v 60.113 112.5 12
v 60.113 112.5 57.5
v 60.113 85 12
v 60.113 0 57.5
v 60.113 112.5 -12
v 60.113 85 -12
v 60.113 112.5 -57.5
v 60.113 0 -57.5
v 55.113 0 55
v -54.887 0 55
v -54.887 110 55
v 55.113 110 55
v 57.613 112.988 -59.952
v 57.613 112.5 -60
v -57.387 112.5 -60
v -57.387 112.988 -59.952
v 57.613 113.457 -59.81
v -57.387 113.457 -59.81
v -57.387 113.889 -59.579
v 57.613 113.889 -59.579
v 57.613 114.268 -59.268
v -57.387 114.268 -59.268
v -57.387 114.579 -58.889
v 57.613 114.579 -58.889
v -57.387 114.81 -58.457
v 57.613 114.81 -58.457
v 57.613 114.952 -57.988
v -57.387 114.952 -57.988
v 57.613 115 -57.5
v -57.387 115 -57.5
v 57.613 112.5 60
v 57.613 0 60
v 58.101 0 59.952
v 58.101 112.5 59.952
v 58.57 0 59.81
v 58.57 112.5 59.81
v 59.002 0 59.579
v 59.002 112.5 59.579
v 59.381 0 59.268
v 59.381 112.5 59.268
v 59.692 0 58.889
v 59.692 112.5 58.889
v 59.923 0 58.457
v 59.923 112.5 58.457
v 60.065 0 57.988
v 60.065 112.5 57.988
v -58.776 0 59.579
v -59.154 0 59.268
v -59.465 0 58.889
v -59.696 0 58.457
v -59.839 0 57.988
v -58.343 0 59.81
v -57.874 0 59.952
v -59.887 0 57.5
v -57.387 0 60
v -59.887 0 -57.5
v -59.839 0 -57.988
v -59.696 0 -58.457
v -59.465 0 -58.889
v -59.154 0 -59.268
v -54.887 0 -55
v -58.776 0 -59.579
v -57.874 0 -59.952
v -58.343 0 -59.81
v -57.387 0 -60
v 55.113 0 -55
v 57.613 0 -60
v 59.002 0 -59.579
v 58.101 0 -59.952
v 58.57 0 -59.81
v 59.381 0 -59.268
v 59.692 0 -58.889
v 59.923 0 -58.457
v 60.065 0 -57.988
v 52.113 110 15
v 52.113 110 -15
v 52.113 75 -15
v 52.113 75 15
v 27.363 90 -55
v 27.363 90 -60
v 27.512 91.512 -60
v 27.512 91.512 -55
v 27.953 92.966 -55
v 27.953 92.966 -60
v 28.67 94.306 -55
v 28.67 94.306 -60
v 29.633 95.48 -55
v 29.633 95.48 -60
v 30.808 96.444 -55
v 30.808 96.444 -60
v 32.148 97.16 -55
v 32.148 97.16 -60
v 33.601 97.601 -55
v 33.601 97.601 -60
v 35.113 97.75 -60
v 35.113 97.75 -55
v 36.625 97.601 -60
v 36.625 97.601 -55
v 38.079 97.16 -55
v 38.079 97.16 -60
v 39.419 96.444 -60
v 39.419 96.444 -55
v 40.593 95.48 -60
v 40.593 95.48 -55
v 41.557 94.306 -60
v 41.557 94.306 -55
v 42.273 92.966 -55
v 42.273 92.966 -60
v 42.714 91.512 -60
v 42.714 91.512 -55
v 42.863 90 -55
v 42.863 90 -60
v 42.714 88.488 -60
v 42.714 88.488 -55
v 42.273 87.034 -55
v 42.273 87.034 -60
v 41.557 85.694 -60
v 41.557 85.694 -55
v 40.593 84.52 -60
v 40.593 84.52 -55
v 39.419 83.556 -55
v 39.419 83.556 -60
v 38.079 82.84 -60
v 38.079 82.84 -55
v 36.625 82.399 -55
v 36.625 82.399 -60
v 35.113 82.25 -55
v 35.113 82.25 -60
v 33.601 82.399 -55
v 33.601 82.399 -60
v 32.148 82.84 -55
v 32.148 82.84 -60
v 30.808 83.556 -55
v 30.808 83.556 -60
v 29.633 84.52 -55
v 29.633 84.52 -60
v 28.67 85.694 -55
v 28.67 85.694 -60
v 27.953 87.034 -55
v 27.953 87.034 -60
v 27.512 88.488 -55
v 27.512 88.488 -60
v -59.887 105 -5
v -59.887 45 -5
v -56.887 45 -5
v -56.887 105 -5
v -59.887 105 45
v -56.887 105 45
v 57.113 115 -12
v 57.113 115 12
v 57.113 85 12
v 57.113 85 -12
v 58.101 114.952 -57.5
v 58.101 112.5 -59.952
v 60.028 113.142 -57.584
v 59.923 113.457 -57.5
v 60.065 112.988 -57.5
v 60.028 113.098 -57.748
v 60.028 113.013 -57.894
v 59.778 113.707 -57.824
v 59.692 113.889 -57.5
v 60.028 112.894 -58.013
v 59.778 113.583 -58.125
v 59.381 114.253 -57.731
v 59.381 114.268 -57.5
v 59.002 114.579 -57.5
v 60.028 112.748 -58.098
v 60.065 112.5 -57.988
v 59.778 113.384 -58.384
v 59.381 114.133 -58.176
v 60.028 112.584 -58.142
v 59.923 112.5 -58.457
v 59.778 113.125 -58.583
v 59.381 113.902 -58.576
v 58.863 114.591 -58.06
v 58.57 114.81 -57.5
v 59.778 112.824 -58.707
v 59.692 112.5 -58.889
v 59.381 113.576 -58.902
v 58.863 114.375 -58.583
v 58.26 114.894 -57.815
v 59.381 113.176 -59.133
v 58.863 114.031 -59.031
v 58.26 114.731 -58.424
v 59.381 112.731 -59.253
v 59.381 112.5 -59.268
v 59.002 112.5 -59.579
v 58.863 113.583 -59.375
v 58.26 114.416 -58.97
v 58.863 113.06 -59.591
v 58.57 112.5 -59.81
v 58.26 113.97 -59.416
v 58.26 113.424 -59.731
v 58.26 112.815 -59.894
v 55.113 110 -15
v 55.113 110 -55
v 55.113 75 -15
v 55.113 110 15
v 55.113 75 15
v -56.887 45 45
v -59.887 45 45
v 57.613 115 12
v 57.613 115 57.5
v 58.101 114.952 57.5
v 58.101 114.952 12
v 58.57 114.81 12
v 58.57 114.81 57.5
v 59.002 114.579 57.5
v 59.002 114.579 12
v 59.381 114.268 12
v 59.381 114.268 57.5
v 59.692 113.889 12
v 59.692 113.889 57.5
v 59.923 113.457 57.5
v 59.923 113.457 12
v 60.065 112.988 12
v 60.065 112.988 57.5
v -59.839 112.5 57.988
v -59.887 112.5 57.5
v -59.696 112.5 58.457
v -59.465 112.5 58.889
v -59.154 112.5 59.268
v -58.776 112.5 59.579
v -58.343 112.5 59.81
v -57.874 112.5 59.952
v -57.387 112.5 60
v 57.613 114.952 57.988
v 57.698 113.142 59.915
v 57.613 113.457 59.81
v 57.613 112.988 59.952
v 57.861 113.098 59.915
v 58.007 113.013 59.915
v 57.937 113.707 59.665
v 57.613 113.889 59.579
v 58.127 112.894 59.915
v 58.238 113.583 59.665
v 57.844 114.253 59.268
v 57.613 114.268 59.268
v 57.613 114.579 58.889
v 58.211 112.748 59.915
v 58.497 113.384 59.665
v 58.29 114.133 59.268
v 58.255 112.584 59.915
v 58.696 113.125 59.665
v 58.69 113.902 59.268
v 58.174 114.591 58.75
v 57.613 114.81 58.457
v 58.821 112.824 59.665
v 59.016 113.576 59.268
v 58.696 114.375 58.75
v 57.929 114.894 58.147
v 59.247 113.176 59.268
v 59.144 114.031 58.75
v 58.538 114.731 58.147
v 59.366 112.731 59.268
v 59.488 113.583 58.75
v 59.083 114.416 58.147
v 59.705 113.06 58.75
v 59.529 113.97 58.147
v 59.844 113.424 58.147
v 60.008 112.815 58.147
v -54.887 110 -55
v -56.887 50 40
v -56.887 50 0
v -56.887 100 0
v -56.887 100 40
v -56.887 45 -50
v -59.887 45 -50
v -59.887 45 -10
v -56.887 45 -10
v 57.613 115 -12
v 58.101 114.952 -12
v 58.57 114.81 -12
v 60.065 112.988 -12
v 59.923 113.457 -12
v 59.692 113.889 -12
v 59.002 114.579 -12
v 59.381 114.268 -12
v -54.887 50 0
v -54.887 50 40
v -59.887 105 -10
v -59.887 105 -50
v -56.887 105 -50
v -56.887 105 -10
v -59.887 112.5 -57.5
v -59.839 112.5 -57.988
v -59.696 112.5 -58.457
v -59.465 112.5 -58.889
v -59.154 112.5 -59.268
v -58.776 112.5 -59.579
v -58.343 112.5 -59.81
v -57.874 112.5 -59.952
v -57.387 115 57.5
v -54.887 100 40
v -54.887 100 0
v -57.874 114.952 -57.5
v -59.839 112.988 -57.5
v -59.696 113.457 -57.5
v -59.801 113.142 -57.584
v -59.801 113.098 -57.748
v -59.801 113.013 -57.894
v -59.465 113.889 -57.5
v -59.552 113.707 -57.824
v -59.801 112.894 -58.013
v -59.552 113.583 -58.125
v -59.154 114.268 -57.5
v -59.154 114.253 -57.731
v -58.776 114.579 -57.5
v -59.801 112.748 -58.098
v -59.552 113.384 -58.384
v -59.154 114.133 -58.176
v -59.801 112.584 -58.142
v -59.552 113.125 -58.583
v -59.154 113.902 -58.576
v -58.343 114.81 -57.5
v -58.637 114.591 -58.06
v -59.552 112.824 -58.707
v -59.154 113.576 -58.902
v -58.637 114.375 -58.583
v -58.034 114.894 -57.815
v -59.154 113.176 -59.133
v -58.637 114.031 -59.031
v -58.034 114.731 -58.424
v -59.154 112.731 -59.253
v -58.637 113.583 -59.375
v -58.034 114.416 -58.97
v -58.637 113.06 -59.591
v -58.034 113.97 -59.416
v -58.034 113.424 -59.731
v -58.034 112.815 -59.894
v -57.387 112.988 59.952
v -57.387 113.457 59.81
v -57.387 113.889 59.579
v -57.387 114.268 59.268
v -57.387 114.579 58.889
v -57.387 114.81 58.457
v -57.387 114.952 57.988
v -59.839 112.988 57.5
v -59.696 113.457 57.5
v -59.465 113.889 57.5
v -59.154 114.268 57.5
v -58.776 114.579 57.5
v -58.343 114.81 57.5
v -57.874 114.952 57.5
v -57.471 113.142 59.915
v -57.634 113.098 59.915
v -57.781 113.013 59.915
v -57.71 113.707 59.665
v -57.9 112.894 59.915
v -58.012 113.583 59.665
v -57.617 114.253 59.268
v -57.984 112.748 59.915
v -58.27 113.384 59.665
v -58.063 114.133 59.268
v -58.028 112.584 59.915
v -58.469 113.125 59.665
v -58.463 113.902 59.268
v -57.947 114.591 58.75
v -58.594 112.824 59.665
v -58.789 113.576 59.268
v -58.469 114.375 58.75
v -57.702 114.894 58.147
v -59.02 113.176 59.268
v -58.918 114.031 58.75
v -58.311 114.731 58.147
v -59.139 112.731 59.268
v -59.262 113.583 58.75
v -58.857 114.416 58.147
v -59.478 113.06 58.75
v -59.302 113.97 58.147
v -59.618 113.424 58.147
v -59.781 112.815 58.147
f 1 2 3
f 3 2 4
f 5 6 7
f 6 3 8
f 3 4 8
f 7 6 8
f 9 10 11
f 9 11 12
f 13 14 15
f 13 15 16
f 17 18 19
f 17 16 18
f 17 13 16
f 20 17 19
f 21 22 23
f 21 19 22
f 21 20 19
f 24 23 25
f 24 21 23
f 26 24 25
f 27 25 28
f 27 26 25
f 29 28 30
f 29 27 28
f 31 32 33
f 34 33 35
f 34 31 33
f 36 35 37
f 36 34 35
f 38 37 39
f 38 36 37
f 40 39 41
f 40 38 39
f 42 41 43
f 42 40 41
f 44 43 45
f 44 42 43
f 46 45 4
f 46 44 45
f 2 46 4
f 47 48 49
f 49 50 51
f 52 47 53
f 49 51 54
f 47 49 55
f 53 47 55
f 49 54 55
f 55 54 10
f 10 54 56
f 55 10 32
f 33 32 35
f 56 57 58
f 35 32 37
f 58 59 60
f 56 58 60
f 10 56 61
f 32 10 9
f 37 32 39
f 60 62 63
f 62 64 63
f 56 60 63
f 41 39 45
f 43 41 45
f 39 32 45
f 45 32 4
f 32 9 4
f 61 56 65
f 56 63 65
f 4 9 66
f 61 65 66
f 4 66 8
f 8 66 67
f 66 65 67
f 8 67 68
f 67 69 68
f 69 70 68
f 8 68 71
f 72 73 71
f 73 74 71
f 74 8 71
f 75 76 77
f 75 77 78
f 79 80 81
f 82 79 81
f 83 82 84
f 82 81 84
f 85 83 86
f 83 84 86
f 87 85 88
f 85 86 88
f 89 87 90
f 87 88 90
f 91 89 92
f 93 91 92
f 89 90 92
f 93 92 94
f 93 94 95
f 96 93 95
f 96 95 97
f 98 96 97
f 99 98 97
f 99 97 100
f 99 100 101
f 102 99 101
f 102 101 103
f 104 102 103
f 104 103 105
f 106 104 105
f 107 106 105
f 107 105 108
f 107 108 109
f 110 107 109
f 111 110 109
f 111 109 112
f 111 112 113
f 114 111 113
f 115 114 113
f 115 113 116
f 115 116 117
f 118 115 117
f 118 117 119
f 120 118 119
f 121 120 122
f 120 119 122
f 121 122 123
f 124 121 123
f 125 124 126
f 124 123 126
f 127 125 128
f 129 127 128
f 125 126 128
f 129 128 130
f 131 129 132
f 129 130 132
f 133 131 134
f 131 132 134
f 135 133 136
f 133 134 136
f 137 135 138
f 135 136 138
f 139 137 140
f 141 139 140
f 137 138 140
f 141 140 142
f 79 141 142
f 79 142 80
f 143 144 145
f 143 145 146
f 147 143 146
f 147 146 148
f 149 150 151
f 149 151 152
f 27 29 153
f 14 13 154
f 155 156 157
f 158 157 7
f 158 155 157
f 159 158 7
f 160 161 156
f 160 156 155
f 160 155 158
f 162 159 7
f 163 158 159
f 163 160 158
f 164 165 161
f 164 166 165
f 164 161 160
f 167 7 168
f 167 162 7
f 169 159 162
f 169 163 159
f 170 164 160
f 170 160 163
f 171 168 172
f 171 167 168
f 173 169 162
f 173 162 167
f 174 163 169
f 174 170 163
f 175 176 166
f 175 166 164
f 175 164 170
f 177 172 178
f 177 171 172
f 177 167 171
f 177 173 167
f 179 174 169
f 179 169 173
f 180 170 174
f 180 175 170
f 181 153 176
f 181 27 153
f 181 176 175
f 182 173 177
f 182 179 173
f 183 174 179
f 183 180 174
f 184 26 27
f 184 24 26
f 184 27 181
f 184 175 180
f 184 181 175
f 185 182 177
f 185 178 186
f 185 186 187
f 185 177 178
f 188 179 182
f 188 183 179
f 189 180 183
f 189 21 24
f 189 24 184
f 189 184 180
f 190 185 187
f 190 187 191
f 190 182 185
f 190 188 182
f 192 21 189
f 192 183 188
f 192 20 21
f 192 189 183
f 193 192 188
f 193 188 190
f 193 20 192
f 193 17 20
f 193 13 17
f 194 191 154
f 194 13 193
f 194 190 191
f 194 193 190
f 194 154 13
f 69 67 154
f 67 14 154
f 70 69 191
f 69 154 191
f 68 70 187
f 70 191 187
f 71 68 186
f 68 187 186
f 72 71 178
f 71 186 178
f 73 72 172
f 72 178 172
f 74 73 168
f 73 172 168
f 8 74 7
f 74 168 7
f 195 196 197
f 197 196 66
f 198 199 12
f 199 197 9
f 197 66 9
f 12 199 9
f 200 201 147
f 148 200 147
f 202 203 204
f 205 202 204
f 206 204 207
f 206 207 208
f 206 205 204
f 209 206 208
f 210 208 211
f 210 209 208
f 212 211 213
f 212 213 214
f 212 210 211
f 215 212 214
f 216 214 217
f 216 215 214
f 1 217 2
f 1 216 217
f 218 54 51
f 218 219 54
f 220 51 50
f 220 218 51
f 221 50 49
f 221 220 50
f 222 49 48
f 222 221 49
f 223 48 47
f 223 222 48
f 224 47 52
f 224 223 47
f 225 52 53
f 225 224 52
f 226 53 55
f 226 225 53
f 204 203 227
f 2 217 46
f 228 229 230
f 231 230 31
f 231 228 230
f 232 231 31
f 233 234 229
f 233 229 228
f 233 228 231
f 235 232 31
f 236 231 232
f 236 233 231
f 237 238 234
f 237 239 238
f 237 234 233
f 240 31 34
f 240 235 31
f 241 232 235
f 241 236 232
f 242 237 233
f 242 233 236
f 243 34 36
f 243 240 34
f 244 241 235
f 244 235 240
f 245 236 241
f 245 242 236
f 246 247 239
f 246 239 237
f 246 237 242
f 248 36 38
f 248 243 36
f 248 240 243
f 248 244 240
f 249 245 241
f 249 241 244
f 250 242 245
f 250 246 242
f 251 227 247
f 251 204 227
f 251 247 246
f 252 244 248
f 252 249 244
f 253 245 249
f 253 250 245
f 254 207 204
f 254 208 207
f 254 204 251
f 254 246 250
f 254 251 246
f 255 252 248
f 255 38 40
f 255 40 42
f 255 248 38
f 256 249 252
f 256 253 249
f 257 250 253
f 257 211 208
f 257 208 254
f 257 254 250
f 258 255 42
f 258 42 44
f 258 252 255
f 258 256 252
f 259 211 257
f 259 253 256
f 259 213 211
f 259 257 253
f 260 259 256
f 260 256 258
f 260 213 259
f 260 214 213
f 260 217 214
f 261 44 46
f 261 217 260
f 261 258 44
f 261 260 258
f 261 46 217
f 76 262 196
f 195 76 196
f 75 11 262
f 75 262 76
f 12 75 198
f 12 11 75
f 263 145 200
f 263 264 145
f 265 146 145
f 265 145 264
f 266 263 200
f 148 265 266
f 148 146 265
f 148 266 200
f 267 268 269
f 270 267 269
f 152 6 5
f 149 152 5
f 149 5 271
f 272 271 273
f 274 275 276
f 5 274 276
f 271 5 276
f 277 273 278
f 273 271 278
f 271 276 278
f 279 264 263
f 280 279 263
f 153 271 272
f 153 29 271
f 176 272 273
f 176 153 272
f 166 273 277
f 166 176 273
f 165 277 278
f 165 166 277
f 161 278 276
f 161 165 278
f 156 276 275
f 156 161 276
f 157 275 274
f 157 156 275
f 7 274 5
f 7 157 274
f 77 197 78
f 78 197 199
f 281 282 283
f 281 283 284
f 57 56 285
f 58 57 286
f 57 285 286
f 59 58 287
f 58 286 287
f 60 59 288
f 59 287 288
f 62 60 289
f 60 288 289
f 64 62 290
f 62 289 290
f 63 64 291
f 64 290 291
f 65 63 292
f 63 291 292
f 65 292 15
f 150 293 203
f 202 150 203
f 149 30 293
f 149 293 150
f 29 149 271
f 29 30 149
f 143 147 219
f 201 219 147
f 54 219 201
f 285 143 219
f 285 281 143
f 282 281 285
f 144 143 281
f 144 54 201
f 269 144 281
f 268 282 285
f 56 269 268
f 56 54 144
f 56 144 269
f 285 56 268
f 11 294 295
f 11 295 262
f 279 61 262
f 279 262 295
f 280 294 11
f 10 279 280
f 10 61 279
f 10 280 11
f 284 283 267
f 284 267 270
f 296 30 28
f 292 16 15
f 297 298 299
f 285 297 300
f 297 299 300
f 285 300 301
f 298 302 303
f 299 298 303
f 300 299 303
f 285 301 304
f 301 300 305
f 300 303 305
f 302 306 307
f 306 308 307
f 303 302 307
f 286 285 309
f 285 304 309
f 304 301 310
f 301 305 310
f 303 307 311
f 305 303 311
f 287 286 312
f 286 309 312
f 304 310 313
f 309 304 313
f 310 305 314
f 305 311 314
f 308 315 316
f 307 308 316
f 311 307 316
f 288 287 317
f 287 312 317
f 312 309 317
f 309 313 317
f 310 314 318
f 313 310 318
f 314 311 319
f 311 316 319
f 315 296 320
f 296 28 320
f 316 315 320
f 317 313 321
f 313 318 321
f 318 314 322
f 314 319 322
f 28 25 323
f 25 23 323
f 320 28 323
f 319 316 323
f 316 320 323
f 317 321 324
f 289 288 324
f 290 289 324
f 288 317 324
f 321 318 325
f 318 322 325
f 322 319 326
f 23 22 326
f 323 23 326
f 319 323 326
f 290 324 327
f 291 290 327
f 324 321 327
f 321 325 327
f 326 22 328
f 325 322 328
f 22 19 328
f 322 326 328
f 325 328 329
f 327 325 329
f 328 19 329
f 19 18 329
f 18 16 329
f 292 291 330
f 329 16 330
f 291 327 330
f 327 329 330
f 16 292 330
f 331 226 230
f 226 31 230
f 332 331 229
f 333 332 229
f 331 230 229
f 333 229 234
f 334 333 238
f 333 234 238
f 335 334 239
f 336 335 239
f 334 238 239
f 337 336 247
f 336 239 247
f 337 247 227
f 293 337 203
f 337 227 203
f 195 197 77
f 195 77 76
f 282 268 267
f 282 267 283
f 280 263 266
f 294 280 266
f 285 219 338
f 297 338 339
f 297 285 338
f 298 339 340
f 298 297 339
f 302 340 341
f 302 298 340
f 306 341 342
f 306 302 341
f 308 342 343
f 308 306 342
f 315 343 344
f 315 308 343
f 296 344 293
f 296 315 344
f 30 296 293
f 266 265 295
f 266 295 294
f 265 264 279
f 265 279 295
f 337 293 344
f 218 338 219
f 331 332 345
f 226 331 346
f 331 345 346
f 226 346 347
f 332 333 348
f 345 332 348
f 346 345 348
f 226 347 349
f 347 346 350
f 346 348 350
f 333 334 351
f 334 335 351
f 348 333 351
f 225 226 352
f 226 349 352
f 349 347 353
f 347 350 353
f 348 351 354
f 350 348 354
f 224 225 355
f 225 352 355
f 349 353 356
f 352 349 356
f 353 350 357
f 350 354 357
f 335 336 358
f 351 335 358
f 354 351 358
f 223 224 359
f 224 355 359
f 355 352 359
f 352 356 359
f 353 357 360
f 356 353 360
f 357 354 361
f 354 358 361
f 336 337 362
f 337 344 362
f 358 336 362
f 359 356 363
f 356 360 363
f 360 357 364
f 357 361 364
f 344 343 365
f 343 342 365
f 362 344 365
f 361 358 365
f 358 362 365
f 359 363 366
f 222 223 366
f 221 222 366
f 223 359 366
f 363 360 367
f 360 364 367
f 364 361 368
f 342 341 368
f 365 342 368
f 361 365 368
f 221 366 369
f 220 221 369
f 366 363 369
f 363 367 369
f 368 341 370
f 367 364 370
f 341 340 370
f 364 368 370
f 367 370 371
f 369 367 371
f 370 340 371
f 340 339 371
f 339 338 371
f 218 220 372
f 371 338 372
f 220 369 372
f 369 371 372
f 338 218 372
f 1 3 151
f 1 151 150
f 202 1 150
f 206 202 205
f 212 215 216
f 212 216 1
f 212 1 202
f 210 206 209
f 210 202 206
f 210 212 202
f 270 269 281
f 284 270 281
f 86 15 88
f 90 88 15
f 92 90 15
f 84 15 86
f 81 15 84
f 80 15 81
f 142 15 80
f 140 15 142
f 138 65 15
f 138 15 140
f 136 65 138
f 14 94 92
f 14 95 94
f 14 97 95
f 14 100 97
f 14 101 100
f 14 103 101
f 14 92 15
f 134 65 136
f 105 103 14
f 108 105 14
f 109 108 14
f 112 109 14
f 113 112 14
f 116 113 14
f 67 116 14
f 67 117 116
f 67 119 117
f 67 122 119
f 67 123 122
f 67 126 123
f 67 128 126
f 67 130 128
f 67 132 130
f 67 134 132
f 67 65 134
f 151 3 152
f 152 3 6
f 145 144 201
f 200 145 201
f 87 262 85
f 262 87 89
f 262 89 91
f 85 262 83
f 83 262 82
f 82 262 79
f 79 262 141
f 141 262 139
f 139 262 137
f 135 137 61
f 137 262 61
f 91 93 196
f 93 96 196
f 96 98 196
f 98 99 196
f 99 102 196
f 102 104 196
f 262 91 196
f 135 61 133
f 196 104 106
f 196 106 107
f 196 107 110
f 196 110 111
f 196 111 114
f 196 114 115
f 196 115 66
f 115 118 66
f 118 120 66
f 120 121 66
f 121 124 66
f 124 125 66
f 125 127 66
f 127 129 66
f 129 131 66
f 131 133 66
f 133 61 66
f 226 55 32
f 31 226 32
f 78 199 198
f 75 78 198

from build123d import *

# Parameters (mm, degrees)
SKETCH1_W           = 120
SKETCH1_H           = 120
BOSS_EXTRUDE1_DEPTH = 115
SKETCH2_W           = 110
SKETCH2_H           = 110
CUT_EXTRUDE1_DEPTH  = 110
SKETCH4_W           = 24
SKETCH4_H           = 30
CUT_EXTRUDE3_DEPTH  = 3
SKETCH6_R           = 7.75
CUT_EXTRUDE5_DEPTH  = 6
SKETCH9_W           = 30
SKETCH9_H           = 35
BOSS_EXTRUDE2_DEPTH = 3
FILLET2_R           = 2.5
SKETCH12_W          = 40
SKETCH12_H          = 50
CUT_EXTRUDE8_DEPTH  = 5
SKETCH13_W          = 50
SKETCH13_H          = 60
CUT_EXTRUDE9_DEPTH  = 3
SKETCH14_W          = 40
SKETCH14_H          = 60
CUT_EXTRUDE10_DEPTH = 3


with BuildPart() as part:
    # Sketch1 → Boss-Extrude1 (new body)
    with BuildSketch(Plane(origin=(0, 0, 0), x_dir=(1, 0, 0), z_dir=(0, 1, 0))):
        with Locations((0.113396959, 0)):
            Rectangle(SKETCH1_W, SKETCH1_H)
    extrude(amount=BOSS_EXTRUDE1_DEPTH)

    # Sketch2 → Cut-Extrude1 (cut)
    with BuildSketch(Plane.XZ):
        with Locations((0.113396959, 0)):
            Rectangle(SKETCH2_W, SKETCH2_H)
    extrude(amount=-CUT_EXTRUDE1_DEPTH, mode=Mode.SUBTRACT)

    # Sketch4 → Cut-Extrude3 (cut)
    with BuildSketch(Plane(origin=(60.113396959, 0, 0), x_dir=(0, 0, -1), z_dir=(1, 0, 0))):
        with Locations((0, 100)):
            Rectangle(SKETCH4_W, SKETCH4_H)
    extrude(amount=-CUT_EXTRUDE3_DEPTH, mode=Mode.SUBTRACT)

    # Sketch6 → Cut-Extrude5 (cut)
    with BuildSketch(Plane(origin=(0, 0, -60), x_dir=(-1, 0, 0), z_dir=(0, 0, -1))):
        with Locations((-35.113396959, 90)):
            Circle(SKETCH6_R)
    extrude(amount=-CUT_EXTRUDE5_DEPTH, mode=Mode.SUBTRACT)

    # Sketch9 → Boss-Extrude2 (add)
    with BuildSketch(Plane.ZY.offset(-55.113396959)):
        with Locations((0, 92.5)):
            Rectangle(SKETCH9_W, SKETCH9_H)
    extrude(amount=BOSS_EXTRUDE2_DEPTH)

    # Fillet2
    fillet2_edges = [part.edges().sort_by_distance(p)[0] for p in [
        (60.113396959, 115, 36),
        (0.113396959, 115, -60),
        (60.113396959, 115, -36),
        (-59.886603041, 115, 0),
        (0.113396959, 115, 60),
        (-59.886603041, 57.5, -60),
        (60.113396959, 57.5, -60),
        (60.113396959, 57.5, 60),
        (-59.886603041, 57.5, 60),
    ]]
    fillet(fillet2_edges, radius=FILLET2_R)

    # Sketch12 → Cut-Extrude8 (cut)
    with BuildSketch(Plane.ZY.offset(59.886603041)):
        with Locations((20, 75)):
            Rectangle(SKETCH12_W, SKETCH12_H)
    extrude(amount=-CUT_EXTRUDE8_DEPTH, mode=Mode.SUBTRACT)

    # Sketch13 → Cut-Extrude9 (cut)
    with BuildSketch(Plane.ZY.offset(59.886603041)):
        with Locations((20, 75)):
            Rectangle(SKETCH13_W, SKETCH13_H)
    extrude(amount=-CUT_EXTRUDE9_DEPTH, mode=Mode.SUBTRACT)

    # Sketch14 → Cut-Extrude10 (cut)
    with BuildSketch(Plane.ZY.offset(59.886603041)):
        with Locations((-30, 75)):
            Rectangle(SKETCH14_W, SKETCH14_H)
    extrude(amount=-CUT_EXTRUDE10_DEPTH, mode=Mode.SUBTRACT)


solid = part.part
